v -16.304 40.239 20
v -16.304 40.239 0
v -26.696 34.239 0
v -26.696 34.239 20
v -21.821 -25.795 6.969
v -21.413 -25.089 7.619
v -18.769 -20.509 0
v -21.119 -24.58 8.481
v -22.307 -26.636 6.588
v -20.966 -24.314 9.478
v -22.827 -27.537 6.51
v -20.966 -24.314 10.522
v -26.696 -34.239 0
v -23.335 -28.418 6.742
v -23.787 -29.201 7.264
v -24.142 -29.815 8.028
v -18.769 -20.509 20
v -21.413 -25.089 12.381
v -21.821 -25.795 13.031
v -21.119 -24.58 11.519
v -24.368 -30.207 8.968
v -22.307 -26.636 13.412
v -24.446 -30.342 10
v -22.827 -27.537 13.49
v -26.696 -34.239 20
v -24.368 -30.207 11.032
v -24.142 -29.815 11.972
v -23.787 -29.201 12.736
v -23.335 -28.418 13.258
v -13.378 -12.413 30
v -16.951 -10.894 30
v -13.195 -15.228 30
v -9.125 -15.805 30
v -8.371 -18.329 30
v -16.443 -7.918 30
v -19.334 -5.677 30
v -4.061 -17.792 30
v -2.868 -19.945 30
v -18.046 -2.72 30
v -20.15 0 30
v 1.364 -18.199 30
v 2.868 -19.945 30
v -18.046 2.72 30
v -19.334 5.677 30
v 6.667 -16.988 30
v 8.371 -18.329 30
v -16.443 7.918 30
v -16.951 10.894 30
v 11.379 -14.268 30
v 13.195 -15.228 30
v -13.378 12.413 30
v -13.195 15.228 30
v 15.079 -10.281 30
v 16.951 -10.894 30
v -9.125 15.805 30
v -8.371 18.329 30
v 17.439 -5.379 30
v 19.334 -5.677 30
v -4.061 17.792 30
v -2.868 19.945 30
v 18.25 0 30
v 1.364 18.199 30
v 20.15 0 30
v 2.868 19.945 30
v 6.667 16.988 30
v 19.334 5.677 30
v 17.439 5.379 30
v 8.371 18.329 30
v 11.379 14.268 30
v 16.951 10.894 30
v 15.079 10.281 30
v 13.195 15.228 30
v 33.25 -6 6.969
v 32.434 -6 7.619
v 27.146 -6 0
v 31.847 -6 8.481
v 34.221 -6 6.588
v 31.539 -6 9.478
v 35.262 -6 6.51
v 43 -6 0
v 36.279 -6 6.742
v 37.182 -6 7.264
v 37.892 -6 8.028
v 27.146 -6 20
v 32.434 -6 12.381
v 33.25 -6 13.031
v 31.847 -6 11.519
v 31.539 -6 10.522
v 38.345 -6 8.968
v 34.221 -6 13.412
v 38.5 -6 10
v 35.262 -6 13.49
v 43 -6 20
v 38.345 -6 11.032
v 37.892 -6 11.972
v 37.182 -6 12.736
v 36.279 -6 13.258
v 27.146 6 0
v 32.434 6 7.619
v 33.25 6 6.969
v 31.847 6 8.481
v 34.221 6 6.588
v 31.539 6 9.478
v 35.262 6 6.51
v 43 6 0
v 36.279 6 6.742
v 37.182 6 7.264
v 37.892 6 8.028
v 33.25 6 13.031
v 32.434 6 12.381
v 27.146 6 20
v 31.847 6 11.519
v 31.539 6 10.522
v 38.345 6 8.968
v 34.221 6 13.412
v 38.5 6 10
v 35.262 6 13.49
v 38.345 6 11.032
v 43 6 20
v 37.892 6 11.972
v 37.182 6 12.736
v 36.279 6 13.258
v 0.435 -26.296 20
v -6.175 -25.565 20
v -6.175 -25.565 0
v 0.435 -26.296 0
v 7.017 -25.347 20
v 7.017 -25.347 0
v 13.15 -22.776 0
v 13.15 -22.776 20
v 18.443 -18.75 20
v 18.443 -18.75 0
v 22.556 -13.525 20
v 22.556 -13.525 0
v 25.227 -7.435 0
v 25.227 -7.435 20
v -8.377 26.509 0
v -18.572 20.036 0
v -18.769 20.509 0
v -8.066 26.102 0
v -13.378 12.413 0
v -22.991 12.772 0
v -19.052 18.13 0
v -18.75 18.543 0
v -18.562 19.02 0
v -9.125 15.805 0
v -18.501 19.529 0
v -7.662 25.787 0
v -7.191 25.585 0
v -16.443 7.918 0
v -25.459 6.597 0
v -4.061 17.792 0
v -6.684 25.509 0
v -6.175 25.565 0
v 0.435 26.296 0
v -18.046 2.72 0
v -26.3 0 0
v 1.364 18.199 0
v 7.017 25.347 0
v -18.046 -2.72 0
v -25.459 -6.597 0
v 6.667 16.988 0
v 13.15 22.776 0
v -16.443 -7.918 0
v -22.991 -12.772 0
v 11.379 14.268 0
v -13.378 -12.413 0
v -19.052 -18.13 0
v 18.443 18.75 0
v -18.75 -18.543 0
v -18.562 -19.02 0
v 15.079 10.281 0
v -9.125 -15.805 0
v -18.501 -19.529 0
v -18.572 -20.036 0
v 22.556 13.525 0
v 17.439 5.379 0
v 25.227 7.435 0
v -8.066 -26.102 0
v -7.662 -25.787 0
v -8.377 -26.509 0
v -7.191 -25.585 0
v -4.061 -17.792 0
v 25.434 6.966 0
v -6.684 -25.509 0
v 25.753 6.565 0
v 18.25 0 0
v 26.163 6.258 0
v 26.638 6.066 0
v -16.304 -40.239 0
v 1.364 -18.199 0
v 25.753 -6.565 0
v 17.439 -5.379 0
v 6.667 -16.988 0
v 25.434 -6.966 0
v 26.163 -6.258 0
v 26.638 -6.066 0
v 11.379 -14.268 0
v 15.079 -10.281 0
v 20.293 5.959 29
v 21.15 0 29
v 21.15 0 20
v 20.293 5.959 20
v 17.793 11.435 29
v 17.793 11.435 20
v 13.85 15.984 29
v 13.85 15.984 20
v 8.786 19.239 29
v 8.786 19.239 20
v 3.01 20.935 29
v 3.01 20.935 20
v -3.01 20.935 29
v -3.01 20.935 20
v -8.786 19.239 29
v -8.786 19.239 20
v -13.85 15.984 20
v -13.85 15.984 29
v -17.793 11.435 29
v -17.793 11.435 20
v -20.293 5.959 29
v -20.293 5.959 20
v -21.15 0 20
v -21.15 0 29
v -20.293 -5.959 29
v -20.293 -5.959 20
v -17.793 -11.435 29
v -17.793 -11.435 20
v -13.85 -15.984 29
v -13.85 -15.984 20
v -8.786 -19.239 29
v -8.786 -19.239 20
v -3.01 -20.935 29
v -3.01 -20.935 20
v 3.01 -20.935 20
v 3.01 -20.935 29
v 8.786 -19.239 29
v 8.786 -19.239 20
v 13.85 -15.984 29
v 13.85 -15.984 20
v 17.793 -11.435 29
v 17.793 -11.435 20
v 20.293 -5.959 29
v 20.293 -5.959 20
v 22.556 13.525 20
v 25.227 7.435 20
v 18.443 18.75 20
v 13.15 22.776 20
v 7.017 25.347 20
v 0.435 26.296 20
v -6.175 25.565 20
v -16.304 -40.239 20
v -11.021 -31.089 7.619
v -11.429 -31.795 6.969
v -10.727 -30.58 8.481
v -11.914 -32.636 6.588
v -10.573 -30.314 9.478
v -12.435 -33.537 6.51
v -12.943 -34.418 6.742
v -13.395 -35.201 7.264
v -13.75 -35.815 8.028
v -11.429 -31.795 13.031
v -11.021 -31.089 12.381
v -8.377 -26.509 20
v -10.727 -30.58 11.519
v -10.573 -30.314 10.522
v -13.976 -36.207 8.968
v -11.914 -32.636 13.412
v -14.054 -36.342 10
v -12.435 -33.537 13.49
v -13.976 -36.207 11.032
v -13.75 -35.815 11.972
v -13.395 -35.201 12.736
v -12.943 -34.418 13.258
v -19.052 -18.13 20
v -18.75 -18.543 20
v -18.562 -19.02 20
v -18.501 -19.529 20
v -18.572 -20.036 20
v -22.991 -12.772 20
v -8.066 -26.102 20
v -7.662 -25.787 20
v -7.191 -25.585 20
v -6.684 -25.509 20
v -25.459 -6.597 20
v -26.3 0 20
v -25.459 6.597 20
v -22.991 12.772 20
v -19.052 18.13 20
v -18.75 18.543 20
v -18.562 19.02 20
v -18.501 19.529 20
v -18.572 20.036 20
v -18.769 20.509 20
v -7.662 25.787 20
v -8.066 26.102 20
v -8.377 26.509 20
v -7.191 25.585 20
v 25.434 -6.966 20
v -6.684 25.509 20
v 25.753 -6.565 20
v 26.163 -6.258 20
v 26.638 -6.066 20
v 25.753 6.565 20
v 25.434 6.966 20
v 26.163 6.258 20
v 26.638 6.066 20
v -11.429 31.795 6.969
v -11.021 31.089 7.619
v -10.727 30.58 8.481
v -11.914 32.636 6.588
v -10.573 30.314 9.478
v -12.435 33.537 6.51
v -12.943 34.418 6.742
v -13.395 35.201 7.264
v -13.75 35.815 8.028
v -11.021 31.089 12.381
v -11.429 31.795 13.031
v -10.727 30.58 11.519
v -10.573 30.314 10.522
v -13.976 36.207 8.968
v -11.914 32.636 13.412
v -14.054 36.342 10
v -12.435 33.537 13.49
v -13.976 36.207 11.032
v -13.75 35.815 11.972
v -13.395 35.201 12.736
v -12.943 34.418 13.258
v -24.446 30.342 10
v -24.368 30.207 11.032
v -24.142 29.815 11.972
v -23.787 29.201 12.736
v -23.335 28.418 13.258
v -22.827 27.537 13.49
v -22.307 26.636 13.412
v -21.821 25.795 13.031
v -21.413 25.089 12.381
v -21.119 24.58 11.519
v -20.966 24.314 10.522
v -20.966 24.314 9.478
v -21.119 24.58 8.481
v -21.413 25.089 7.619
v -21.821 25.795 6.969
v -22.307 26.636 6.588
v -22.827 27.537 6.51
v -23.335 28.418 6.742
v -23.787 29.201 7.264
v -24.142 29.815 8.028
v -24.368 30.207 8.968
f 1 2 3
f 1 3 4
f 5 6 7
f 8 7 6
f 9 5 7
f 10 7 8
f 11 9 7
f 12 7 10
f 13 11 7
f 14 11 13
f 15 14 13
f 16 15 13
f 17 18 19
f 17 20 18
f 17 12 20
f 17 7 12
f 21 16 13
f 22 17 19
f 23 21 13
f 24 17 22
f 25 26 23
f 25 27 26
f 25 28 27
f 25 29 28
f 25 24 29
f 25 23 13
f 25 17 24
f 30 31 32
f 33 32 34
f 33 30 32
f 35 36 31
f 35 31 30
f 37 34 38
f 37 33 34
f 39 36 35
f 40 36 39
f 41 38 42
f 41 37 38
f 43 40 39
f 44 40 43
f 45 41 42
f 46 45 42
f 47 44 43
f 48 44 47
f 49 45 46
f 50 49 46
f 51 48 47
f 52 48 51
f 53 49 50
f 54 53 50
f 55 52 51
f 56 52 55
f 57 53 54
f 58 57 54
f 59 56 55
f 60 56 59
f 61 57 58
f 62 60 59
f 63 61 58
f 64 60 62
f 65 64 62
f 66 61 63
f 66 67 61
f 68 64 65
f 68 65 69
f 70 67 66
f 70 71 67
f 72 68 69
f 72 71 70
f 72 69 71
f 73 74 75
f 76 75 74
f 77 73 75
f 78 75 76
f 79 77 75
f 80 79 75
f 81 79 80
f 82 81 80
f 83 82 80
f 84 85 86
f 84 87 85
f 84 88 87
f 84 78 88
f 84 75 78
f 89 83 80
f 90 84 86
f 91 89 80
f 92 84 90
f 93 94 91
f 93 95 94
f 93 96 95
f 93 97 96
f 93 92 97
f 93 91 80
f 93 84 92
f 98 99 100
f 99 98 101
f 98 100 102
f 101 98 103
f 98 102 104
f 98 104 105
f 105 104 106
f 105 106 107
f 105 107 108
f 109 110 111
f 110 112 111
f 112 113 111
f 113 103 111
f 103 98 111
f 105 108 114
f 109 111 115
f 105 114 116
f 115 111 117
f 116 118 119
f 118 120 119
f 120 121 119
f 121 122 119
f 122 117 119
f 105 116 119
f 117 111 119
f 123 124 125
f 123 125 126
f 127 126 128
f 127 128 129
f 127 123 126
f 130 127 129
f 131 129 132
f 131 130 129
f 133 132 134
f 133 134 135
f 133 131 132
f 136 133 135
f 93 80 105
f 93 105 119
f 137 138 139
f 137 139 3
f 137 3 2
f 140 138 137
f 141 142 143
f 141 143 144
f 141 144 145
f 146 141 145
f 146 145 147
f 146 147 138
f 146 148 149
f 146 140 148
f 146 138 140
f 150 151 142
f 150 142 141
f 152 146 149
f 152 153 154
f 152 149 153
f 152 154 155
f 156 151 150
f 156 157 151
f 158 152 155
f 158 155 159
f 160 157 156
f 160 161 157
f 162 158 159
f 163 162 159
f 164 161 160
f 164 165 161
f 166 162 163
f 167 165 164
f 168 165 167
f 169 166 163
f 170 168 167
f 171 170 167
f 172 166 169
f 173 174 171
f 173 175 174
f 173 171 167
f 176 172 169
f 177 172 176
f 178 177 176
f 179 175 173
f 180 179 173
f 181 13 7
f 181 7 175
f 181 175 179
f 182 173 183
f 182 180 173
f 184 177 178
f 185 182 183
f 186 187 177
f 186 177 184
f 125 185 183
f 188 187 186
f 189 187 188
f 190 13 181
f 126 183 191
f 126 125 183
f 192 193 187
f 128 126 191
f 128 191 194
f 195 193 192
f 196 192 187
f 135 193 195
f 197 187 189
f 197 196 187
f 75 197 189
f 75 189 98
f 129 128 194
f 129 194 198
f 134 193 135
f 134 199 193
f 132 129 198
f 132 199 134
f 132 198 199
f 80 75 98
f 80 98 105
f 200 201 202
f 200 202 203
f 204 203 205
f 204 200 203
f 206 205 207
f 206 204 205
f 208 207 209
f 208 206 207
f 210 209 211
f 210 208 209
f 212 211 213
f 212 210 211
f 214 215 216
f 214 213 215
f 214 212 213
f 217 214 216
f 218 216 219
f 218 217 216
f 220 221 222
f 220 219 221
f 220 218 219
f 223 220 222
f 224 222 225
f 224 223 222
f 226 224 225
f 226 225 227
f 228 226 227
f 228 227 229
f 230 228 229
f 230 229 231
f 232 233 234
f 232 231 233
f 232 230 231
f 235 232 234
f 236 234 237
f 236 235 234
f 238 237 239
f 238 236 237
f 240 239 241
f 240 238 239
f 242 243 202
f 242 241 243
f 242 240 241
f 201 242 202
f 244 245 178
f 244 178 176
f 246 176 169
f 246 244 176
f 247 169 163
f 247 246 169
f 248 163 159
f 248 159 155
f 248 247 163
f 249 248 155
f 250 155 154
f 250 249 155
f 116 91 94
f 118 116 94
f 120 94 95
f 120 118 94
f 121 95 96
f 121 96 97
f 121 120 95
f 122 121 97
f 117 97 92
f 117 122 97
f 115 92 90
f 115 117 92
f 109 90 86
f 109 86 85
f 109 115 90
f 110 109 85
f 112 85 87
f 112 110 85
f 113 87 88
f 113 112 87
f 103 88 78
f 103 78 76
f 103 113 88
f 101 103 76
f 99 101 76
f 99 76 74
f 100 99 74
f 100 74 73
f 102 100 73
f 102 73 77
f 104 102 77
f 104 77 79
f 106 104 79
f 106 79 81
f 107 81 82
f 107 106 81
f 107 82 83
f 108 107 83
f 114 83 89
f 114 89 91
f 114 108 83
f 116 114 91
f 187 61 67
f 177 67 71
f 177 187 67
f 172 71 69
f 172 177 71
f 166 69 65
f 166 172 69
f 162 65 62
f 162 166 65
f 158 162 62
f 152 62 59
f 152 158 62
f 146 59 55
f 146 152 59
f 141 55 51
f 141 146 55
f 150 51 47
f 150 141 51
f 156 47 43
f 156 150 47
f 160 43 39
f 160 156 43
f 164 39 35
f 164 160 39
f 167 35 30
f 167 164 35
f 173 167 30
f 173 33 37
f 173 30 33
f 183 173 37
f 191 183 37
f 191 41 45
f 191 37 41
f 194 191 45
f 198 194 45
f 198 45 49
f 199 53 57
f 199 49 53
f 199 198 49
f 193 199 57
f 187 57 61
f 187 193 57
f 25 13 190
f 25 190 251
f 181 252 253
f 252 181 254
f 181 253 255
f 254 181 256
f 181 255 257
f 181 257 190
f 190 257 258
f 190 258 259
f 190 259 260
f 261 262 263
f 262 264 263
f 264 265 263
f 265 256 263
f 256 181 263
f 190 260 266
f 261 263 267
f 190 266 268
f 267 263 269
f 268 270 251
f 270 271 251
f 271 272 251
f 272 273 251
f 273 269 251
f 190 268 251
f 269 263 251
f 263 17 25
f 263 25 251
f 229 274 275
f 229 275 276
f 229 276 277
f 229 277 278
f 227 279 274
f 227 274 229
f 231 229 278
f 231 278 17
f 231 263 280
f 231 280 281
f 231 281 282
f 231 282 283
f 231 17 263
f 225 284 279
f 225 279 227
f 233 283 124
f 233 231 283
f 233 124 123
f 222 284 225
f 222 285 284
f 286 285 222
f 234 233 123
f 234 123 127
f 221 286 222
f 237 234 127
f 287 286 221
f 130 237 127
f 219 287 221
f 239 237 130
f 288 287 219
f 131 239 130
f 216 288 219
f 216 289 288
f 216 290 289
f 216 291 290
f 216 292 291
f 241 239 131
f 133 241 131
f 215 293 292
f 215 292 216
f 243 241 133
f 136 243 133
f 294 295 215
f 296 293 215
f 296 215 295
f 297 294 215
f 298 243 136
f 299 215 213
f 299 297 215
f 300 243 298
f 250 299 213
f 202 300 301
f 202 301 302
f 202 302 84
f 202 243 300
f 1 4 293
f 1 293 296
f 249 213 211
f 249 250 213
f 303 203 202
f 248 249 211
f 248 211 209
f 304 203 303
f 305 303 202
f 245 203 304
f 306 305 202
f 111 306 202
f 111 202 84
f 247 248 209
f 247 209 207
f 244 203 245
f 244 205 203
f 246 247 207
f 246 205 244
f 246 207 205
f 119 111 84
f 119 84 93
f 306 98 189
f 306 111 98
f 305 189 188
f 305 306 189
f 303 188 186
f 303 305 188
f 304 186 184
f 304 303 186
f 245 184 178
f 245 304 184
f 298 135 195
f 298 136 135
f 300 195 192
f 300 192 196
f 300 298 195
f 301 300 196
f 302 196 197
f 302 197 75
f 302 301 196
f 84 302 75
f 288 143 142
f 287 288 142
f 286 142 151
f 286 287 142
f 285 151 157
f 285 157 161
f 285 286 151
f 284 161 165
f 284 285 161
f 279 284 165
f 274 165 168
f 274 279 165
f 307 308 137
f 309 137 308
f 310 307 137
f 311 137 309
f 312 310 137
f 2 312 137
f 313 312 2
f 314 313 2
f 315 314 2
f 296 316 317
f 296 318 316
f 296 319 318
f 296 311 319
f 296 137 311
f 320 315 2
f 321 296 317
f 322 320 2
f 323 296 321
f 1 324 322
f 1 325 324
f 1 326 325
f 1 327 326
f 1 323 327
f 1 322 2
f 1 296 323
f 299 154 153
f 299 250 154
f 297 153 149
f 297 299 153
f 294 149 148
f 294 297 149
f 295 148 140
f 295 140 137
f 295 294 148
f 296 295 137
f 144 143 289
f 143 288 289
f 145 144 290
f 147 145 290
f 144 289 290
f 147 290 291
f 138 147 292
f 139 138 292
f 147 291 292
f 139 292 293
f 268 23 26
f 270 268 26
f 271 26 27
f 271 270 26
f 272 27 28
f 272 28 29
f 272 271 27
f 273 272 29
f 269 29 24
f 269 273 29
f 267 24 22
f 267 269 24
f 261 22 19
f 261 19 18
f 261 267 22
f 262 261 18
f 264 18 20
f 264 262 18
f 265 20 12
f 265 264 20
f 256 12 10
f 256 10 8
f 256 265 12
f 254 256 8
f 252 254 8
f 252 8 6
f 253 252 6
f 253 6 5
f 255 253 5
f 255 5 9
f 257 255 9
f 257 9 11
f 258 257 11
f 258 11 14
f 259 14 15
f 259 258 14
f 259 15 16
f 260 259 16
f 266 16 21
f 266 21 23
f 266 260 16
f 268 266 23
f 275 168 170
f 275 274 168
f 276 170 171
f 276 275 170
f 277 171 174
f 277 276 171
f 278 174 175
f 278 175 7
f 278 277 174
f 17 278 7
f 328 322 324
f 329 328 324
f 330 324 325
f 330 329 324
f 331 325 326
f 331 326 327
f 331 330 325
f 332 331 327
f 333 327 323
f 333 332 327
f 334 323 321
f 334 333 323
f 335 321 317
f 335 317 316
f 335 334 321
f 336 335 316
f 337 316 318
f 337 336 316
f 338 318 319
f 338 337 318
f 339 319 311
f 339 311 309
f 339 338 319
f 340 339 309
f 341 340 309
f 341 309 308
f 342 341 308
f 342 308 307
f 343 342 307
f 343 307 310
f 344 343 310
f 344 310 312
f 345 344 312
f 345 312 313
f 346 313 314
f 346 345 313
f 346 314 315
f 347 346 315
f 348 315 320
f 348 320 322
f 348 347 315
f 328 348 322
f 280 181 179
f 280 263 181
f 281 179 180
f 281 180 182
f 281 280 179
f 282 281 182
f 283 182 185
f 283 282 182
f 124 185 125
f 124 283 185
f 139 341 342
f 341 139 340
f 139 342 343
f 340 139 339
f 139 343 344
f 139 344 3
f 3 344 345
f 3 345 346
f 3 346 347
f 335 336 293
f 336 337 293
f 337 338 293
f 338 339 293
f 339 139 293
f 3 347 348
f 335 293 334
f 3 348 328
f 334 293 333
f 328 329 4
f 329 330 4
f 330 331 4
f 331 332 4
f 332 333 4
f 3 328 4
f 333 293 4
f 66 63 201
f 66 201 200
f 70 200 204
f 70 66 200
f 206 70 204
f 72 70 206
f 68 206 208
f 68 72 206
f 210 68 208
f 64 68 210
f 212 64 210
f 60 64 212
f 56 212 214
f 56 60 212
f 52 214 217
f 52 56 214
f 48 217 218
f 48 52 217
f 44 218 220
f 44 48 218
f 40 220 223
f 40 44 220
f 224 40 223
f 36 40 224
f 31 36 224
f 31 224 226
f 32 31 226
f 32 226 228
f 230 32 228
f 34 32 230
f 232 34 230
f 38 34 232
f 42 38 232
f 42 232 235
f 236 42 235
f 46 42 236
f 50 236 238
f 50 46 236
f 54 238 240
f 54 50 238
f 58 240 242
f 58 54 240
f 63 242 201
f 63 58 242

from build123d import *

# Parameters (mm, degrees)
F2_W            = 43
F2_H            = 20
F2_R            = 3.5
F3_DEPTH        = 6
F3_COPIES_COUNT = 3
F4_R            = 18.25
F5_DEPTH        = 30.001
F6_SIZE         = 1
F7_R            = 2


# Not quite as in the source:
# - a pattern or mirror of a feature is missing from the dataset's text; its kind, count and spacing are read off the source's solid


with BuildPart() as f1:
    # F0 (on Front) → F1 (revolve)
    with BuildSketch(Plane.XZ):
        Polygon((21.15, 30), (0, 30), (0, 0), (26.3, 0), (26.3, 20), (21.15, 20), align=None)
    revolve(axis=Axis((0, 0, 22.5), (0, 0, 1)))

    # F2 (on Front) → F3 (join, symmetric)
    with BuildSketch(Plane.XZ):
        with Locations((21.5, 10)):
            Rectangle(F2_W, F2_H)
        with Locations((35, 10)):
            Circle(F2_R, mode=Mode.SUBTRACT)
    f3 = extrude(amount=F3_DEPTH, both=True)

    # F3_copies: F3 ×3 about axis
    f3_copies_axis = Axis((0, 0, 0), (0, 0, 1))
    for i in range(1, F3_COPIES_COUNT):
        add(f3.rotate(f3_copies_axis, i * 360 / F3_COPIES_COUNT))

    # F4 (on Top) → F5 (cut, through all)
    with BuildSketch(Plane.XY):
        Circle(F4_R)
    extrude(amount=F5_DEPTH, mode=Mode.SUBTRACT)

    # F6
    f6_edges = [f1.edges().sort_by_distance(p)[0] for p in [
        (-21.15, 0, 30),
    ]]
    chamfer(f6_edges, length=F6_SIZE)

    # F7
    f7_edges = [f1.edges().sort_by_distance(p)[0] for p in [
        (25.606445, -6, 10),
        (25.606445, 6, 10),
        (-7.60707, 25.175831, 10),
        (-17.999375, 19.175831, 10),
        (-7.60707, -25.175831, 10),
        (-17.999375, -19.175831, 10),
    ]]
    fillet(f7_edges, radius=F7_R)


solid = f1.part
